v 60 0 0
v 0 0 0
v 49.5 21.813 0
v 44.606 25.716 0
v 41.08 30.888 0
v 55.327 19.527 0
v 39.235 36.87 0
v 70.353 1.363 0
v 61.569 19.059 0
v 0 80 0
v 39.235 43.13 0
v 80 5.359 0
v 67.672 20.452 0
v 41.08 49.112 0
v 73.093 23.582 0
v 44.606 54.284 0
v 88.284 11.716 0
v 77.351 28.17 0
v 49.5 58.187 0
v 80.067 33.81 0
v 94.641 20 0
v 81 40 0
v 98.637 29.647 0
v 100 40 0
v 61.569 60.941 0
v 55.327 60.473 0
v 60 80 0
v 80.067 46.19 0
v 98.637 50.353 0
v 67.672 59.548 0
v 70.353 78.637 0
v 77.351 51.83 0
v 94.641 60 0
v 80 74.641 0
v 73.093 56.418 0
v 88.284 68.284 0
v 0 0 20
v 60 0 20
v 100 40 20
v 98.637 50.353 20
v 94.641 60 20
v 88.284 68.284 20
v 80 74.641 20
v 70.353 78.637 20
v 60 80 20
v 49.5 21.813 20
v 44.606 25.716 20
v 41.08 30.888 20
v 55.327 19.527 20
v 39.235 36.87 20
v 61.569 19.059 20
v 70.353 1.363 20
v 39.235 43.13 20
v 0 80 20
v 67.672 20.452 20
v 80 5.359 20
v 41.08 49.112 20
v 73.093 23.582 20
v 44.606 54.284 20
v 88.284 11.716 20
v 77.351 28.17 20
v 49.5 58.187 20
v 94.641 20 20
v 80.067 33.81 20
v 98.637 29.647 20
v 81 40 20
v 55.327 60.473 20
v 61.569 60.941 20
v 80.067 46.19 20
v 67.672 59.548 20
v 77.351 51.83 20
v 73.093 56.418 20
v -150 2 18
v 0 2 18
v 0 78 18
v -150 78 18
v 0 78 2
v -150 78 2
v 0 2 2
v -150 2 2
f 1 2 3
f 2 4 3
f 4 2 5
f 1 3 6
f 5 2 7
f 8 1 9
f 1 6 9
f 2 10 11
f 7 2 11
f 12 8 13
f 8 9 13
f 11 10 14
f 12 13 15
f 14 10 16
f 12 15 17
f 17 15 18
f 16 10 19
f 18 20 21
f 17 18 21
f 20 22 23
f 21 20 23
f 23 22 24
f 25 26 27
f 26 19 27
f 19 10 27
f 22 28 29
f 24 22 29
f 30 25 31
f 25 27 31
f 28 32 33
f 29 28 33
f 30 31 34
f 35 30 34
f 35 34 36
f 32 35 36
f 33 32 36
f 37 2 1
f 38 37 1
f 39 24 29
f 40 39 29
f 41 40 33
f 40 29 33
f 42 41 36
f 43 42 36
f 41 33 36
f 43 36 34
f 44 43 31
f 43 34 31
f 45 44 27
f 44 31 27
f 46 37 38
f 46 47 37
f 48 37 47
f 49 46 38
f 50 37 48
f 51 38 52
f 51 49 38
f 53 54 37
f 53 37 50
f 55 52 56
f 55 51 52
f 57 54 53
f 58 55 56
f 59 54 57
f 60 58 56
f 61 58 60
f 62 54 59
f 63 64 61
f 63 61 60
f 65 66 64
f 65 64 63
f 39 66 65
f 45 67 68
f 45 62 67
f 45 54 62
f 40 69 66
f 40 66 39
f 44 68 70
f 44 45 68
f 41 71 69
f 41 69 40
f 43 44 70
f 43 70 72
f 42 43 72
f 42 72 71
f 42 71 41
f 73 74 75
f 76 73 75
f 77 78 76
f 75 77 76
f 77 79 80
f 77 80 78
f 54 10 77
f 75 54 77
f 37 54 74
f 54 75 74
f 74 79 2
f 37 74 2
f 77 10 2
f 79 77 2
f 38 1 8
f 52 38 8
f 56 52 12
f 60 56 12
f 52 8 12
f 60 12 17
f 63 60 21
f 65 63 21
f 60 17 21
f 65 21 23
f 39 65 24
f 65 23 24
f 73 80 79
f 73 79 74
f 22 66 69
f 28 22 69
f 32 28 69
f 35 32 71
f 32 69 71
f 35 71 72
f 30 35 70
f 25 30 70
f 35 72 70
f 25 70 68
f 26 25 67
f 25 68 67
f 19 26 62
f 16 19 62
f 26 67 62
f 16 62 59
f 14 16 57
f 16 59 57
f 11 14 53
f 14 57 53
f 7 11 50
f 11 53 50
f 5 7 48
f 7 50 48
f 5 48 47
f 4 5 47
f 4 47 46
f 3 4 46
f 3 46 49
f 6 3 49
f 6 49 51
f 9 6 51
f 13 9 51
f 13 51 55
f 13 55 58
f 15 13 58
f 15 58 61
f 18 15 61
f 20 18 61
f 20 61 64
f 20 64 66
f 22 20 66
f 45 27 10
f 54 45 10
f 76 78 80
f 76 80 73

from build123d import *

# Parameters (mm, degrees)
BOSS_EXTRUDE1_DEPTH = 20
SKETCH2_R           = 21
CUT_EXTRUDE1_DEPTH  = 21
SKETCH3_W           = 16
SKETCH3_H           = 76
BOSS_EXTRUDE2_DEPTH = 150


with BuildPart() as part:
    # Sketch1 → Boss-Extrude1 (new body)
    with BuildSketch(Plane.XY):
        with BuildLine():
            Line((0, 80), (0, 0))
            Line((0, 0), (60, 0))
            ThreePointArc((60, 0), (88.284271247, 11.715728753), (100, 40))
            ThreePointArc((100, 40), (88.284271247, 68.284271247), (60, 80))
            Line((60, 80), (0, 80))
        make_face()
    extrude(amount=BOSS_EXTRUDE1_DEPTH)

    # Sketch2 → Cut-Extrude1 (cut, through all)
    with BuildSketch(Plane.XY.offset(20)):
        with Locations((60, 40)):
            Circle(SKETCH2_R)
    extrude(amount=-CUT_EXTRUDE1_DEPTH, mode=Mode.SUBTRACT)

    # Sketch3 → Boss-Extrude2 (add)
    with BuildSketch(Plane.ZY):
        with Locations((10, 40)):
            Rectangle(SKETCH3_W, SKETCH3_H)
    extrude(amount=BOSS_EXTRUDE2_DEPTH)


solid = part.part
